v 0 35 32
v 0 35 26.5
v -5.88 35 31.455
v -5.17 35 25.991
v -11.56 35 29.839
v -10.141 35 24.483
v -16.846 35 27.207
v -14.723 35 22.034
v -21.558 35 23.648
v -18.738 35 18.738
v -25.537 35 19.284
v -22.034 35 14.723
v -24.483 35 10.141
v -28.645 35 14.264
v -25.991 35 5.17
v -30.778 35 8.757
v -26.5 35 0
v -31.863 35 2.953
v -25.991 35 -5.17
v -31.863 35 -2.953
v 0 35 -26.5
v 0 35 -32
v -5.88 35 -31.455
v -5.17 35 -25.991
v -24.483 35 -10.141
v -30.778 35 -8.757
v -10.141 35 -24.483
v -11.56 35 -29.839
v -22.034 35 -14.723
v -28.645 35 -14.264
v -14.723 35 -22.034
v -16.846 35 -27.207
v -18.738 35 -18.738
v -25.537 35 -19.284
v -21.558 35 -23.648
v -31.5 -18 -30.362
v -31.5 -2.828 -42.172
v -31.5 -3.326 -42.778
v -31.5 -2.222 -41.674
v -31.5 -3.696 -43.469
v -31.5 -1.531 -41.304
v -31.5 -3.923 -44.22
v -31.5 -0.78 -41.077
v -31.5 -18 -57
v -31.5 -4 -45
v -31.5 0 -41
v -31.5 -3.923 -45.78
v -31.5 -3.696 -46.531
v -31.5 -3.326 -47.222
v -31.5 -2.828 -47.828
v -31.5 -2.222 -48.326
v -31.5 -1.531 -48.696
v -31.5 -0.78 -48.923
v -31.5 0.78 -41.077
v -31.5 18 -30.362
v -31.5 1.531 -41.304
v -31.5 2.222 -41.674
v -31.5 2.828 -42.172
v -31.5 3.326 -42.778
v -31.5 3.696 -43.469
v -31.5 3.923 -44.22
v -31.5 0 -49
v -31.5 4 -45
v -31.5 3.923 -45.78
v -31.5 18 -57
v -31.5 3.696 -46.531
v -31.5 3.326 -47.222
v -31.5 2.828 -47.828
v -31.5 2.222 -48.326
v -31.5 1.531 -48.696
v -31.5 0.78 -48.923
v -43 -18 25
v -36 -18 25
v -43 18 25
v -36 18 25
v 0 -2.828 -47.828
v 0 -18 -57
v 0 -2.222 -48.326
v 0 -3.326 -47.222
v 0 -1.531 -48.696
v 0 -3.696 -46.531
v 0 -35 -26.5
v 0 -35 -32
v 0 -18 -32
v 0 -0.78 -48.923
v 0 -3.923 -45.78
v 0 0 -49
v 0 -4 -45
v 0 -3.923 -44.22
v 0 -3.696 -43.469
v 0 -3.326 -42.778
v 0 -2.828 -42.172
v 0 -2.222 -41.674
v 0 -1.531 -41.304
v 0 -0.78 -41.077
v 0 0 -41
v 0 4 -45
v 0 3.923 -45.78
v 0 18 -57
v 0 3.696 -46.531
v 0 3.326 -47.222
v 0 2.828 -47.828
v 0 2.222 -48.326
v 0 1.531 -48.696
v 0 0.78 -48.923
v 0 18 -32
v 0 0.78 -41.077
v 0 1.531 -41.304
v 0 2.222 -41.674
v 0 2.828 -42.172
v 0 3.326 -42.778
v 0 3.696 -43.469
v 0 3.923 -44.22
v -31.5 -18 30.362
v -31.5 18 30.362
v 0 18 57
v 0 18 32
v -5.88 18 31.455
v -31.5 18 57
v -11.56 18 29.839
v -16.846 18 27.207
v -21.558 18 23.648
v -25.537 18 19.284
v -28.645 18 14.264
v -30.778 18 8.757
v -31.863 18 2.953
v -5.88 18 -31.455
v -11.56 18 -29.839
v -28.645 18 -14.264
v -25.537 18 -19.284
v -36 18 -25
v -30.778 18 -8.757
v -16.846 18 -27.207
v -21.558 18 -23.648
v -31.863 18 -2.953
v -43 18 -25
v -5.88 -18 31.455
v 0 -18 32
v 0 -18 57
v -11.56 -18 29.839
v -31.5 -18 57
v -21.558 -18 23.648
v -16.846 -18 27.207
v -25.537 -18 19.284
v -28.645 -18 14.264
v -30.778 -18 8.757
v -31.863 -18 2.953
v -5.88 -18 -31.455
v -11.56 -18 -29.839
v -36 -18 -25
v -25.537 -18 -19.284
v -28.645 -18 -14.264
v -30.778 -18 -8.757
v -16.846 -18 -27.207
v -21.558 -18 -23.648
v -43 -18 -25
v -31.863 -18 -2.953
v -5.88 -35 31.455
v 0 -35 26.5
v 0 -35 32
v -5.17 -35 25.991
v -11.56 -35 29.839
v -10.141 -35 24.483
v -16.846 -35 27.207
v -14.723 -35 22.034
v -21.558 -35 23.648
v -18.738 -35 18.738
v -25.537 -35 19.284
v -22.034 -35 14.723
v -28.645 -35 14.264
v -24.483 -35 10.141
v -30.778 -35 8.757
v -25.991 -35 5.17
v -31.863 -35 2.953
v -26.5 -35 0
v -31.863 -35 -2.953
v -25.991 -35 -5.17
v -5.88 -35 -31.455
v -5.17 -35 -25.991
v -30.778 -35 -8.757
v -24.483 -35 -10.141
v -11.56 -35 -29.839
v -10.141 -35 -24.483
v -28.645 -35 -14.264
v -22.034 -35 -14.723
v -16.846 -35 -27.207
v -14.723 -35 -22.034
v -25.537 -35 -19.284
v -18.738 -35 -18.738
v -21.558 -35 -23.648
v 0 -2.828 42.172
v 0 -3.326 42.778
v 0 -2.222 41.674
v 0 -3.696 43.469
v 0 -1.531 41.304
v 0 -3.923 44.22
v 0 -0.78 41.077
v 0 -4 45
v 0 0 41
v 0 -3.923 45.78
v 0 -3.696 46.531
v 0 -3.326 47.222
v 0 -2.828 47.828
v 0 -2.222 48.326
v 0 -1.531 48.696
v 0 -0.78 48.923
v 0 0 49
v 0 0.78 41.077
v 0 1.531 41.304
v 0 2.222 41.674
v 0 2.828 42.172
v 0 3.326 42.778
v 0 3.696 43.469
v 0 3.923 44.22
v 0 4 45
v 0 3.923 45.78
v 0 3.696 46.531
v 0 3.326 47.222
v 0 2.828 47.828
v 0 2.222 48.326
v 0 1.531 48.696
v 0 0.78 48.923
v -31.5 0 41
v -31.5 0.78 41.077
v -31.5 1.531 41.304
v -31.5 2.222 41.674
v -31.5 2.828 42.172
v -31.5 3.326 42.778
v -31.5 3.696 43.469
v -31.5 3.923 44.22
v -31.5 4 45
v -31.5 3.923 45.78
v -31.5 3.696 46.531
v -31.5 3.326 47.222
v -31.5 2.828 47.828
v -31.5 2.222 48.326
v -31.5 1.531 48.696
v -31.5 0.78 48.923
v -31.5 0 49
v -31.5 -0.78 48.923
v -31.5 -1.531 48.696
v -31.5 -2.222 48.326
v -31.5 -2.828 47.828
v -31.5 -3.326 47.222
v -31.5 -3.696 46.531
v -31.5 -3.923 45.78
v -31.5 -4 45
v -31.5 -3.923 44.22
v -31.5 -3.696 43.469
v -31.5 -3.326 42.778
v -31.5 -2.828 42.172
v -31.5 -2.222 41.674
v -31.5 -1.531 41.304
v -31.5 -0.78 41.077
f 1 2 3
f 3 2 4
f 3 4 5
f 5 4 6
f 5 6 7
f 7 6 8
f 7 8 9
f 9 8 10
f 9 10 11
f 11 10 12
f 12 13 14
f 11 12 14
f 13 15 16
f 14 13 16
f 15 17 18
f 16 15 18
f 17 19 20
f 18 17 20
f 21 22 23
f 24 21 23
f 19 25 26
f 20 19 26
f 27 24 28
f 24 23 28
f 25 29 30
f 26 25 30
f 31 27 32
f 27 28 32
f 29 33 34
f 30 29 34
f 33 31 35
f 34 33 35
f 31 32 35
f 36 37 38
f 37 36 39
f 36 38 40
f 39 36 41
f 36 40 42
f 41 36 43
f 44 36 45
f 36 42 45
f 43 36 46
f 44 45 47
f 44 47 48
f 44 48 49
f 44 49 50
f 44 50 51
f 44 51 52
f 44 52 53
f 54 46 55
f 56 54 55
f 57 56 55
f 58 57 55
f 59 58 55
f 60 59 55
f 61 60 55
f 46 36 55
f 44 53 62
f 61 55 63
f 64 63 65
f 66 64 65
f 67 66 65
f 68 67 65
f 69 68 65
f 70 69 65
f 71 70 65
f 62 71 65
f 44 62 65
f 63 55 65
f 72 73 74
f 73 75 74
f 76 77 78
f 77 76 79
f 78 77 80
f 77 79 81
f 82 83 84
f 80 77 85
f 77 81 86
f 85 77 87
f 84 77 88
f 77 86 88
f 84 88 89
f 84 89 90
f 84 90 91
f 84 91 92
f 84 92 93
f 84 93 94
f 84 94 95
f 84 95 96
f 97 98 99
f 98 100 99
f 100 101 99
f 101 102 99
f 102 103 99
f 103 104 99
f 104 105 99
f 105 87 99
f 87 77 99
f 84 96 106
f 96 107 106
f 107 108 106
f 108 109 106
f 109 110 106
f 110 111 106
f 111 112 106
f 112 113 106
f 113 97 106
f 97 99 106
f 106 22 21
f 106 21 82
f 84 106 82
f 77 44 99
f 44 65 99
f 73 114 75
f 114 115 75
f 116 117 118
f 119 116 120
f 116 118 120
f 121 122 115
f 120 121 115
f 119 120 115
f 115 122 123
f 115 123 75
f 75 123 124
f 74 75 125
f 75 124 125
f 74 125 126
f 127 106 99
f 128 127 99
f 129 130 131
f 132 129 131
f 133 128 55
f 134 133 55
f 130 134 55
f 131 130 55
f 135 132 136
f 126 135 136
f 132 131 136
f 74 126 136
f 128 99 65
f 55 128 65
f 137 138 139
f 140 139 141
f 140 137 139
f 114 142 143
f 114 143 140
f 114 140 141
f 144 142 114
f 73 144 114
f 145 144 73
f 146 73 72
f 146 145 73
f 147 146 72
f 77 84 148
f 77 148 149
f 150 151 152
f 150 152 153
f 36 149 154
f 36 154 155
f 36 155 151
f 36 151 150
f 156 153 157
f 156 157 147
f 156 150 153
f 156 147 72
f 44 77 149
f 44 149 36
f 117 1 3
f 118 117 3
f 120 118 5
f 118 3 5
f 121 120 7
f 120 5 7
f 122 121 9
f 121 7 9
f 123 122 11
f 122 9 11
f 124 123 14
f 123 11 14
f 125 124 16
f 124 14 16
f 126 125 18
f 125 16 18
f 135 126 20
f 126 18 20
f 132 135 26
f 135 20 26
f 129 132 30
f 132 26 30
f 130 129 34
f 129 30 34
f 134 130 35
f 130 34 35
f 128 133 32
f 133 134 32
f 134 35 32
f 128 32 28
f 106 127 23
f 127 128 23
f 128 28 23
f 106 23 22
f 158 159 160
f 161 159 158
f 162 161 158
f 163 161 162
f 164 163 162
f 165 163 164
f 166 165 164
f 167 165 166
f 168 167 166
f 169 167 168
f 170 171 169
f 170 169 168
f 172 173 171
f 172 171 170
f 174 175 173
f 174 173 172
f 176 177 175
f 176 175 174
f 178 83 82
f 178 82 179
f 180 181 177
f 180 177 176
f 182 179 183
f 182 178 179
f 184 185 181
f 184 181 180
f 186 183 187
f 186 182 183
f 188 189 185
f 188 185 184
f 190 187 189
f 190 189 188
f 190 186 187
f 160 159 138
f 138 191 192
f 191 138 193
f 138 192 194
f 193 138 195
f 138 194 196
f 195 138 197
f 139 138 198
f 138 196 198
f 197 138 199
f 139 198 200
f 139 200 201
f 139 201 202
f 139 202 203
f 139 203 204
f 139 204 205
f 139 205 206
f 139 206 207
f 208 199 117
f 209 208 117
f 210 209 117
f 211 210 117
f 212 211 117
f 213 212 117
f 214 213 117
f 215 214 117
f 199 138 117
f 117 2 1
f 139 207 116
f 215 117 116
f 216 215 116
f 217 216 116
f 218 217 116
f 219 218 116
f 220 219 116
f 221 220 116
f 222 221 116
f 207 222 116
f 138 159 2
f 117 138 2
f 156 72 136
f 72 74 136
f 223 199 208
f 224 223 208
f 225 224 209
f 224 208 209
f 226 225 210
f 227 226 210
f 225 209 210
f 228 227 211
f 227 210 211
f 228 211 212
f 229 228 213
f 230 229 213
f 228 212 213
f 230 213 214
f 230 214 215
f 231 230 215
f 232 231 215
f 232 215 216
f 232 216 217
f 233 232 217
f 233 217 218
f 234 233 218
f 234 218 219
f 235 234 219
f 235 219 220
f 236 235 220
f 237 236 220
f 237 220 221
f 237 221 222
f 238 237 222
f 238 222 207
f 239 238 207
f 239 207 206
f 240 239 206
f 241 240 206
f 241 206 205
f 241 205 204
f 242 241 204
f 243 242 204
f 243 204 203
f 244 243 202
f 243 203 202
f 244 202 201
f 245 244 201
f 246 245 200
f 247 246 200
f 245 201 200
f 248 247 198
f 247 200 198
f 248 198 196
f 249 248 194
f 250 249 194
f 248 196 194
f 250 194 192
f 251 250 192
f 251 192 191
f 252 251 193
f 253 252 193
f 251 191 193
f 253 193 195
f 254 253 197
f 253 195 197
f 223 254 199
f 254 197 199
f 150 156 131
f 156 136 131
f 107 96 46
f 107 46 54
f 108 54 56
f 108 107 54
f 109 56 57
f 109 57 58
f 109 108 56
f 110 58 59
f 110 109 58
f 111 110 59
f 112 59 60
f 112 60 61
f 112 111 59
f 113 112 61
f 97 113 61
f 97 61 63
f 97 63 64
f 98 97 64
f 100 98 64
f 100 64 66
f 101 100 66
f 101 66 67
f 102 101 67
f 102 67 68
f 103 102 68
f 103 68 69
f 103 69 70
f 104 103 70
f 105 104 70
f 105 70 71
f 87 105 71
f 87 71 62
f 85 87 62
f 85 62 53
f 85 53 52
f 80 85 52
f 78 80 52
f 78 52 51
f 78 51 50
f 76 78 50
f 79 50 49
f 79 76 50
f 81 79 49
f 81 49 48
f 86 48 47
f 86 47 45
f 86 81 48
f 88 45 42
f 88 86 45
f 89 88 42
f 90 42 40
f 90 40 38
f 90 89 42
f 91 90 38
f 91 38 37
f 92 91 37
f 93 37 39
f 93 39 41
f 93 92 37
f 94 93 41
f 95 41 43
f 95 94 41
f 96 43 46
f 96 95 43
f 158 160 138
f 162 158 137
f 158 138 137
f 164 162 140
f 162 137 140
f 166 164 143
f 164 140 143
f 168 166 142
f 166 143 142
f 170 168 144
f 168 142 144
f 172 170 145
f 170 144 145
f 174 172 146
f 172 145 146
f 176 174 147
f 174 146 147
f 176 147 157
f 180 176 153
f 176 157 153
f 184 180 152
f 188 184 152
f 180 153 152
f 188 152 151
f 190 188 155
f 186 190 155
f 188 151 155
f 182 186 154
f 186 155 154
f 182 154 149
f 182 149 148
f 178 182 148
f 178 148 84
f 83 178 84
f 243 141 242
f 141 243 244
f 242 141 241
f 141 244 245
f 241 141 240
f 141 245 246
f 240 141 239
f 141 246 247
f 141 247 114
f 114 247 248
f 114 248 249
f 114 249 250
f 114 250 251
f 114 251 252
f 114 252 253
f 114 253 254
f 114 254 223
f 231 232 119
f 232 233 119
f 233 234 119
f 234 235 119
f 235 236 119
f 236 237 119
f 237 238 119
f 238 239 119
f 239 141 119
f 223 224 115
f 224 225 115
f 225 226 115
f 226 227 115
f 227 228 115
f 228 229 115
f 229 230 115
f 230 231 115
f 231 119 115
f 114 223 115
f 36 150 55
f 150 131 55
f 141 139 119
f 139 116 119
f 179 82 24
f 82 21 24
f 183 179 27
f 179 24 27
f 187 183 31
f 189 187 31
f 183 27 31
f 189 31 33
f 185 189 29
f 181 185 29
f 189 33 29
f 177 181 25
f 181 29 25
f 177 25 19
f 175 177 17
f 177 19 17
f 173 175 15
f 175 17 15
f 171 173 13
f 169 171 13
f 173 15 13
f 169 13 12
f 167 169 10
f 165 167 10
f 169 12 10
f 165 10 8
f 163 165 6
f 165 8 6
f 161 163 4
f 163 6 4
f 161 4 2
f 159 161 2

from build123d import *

# Parameters (mm, degrees)
BOSS_EXTRUDE1_DEPTH = 18
BOSS_EXTRUDE2_DEPTH = 35
CUT_EXTRUDE1_REACH  = 81.517
SKETCH2_R           = 4


with BuildPart() as part:
    # Sketch1 → Boss-Extrude1 (new, symmetric)
    with BuildSketch(Plane(origin=(0, 0, 0), x_dir=(1, 0, 0), z_dir=(0, 1, 0))):
        with BuildLine():
            ThreePointArc((0, -32), (-32, 0), (0, 32))
            Line((0, 32), (0, 57))
            Line((0, 57), (-31.500486732, 57))
            Line((-31.500486732, 57), (-31.500486732, 30.362311102))
            Line((-31.500486732, 30.362311102), (-36, 25))
            Line((-36, 25), (-43, 25))
            Line((-43, 25), (-43, -25))
            Line((-43, -25), (-36, -25))
            Line((-36, -25), (-31.500486732, -30.362311102))
            Line((-31.500486732, -30.362311102), (-31.500486732, -57))
            Line((-31.500486732, -57), (0, -57))
            Line((0, -57), (0, -32))
        make_face()
    extrude(amount=BOSS_EXTRUDE1_DEPTH, both=True)

    # Sketch1<3> → Boss-Extrude2 (add, symmetric)
    with BuildSketch(Plane(origin=(0, 0, 0), x_dir=(1, 0, 0), z_dir=(0, 1, 0))):
        with BuildLine():
            ThreePointArc((0, -26.5), (-26.5, 0), (0, 26.5))
            Line((0, 26.5), (0, 32))
            ThreePointArc((0, 32), (-32, 0), (0, -32))
            Line((0, -32), (0, -26.5))
        make_face()
    extrude(amount=BOSS_EXTRUDE2_DEPTH, both=True)

    # Sketch2 → Cut-Extrude1 (cut, up to next)
    with BuildSketch(Plane(origin=(0, 0, 0), x_dir=(0, 0, -1), z_dir=(1, 0, 0)), mode=Mode.PRIVATE) as cut_extrude1_sk1:
        with Locations((-45, 0)):
            Circle(SKETCH2_R)
    cut_extrude1_tool1 = extrude(cut_extrude1_sk1.sketch, amount=-CUT_EXTRUDE1_REACH, mode=Mode.PRIVATE) & part.part
    cut_extrude1 = cut_extrude1_tool1.solids().sort_by_distance((0, 0, 45))[0]
    add(cut_extrude1, mode=Mode.SUBTRACT)

    # Mirror1: Cut-Extrude1 across plane
    add(cut_extrude1.mirror(Plane.XY), mode=Mode.SUBTRACT)


solid = part.part
